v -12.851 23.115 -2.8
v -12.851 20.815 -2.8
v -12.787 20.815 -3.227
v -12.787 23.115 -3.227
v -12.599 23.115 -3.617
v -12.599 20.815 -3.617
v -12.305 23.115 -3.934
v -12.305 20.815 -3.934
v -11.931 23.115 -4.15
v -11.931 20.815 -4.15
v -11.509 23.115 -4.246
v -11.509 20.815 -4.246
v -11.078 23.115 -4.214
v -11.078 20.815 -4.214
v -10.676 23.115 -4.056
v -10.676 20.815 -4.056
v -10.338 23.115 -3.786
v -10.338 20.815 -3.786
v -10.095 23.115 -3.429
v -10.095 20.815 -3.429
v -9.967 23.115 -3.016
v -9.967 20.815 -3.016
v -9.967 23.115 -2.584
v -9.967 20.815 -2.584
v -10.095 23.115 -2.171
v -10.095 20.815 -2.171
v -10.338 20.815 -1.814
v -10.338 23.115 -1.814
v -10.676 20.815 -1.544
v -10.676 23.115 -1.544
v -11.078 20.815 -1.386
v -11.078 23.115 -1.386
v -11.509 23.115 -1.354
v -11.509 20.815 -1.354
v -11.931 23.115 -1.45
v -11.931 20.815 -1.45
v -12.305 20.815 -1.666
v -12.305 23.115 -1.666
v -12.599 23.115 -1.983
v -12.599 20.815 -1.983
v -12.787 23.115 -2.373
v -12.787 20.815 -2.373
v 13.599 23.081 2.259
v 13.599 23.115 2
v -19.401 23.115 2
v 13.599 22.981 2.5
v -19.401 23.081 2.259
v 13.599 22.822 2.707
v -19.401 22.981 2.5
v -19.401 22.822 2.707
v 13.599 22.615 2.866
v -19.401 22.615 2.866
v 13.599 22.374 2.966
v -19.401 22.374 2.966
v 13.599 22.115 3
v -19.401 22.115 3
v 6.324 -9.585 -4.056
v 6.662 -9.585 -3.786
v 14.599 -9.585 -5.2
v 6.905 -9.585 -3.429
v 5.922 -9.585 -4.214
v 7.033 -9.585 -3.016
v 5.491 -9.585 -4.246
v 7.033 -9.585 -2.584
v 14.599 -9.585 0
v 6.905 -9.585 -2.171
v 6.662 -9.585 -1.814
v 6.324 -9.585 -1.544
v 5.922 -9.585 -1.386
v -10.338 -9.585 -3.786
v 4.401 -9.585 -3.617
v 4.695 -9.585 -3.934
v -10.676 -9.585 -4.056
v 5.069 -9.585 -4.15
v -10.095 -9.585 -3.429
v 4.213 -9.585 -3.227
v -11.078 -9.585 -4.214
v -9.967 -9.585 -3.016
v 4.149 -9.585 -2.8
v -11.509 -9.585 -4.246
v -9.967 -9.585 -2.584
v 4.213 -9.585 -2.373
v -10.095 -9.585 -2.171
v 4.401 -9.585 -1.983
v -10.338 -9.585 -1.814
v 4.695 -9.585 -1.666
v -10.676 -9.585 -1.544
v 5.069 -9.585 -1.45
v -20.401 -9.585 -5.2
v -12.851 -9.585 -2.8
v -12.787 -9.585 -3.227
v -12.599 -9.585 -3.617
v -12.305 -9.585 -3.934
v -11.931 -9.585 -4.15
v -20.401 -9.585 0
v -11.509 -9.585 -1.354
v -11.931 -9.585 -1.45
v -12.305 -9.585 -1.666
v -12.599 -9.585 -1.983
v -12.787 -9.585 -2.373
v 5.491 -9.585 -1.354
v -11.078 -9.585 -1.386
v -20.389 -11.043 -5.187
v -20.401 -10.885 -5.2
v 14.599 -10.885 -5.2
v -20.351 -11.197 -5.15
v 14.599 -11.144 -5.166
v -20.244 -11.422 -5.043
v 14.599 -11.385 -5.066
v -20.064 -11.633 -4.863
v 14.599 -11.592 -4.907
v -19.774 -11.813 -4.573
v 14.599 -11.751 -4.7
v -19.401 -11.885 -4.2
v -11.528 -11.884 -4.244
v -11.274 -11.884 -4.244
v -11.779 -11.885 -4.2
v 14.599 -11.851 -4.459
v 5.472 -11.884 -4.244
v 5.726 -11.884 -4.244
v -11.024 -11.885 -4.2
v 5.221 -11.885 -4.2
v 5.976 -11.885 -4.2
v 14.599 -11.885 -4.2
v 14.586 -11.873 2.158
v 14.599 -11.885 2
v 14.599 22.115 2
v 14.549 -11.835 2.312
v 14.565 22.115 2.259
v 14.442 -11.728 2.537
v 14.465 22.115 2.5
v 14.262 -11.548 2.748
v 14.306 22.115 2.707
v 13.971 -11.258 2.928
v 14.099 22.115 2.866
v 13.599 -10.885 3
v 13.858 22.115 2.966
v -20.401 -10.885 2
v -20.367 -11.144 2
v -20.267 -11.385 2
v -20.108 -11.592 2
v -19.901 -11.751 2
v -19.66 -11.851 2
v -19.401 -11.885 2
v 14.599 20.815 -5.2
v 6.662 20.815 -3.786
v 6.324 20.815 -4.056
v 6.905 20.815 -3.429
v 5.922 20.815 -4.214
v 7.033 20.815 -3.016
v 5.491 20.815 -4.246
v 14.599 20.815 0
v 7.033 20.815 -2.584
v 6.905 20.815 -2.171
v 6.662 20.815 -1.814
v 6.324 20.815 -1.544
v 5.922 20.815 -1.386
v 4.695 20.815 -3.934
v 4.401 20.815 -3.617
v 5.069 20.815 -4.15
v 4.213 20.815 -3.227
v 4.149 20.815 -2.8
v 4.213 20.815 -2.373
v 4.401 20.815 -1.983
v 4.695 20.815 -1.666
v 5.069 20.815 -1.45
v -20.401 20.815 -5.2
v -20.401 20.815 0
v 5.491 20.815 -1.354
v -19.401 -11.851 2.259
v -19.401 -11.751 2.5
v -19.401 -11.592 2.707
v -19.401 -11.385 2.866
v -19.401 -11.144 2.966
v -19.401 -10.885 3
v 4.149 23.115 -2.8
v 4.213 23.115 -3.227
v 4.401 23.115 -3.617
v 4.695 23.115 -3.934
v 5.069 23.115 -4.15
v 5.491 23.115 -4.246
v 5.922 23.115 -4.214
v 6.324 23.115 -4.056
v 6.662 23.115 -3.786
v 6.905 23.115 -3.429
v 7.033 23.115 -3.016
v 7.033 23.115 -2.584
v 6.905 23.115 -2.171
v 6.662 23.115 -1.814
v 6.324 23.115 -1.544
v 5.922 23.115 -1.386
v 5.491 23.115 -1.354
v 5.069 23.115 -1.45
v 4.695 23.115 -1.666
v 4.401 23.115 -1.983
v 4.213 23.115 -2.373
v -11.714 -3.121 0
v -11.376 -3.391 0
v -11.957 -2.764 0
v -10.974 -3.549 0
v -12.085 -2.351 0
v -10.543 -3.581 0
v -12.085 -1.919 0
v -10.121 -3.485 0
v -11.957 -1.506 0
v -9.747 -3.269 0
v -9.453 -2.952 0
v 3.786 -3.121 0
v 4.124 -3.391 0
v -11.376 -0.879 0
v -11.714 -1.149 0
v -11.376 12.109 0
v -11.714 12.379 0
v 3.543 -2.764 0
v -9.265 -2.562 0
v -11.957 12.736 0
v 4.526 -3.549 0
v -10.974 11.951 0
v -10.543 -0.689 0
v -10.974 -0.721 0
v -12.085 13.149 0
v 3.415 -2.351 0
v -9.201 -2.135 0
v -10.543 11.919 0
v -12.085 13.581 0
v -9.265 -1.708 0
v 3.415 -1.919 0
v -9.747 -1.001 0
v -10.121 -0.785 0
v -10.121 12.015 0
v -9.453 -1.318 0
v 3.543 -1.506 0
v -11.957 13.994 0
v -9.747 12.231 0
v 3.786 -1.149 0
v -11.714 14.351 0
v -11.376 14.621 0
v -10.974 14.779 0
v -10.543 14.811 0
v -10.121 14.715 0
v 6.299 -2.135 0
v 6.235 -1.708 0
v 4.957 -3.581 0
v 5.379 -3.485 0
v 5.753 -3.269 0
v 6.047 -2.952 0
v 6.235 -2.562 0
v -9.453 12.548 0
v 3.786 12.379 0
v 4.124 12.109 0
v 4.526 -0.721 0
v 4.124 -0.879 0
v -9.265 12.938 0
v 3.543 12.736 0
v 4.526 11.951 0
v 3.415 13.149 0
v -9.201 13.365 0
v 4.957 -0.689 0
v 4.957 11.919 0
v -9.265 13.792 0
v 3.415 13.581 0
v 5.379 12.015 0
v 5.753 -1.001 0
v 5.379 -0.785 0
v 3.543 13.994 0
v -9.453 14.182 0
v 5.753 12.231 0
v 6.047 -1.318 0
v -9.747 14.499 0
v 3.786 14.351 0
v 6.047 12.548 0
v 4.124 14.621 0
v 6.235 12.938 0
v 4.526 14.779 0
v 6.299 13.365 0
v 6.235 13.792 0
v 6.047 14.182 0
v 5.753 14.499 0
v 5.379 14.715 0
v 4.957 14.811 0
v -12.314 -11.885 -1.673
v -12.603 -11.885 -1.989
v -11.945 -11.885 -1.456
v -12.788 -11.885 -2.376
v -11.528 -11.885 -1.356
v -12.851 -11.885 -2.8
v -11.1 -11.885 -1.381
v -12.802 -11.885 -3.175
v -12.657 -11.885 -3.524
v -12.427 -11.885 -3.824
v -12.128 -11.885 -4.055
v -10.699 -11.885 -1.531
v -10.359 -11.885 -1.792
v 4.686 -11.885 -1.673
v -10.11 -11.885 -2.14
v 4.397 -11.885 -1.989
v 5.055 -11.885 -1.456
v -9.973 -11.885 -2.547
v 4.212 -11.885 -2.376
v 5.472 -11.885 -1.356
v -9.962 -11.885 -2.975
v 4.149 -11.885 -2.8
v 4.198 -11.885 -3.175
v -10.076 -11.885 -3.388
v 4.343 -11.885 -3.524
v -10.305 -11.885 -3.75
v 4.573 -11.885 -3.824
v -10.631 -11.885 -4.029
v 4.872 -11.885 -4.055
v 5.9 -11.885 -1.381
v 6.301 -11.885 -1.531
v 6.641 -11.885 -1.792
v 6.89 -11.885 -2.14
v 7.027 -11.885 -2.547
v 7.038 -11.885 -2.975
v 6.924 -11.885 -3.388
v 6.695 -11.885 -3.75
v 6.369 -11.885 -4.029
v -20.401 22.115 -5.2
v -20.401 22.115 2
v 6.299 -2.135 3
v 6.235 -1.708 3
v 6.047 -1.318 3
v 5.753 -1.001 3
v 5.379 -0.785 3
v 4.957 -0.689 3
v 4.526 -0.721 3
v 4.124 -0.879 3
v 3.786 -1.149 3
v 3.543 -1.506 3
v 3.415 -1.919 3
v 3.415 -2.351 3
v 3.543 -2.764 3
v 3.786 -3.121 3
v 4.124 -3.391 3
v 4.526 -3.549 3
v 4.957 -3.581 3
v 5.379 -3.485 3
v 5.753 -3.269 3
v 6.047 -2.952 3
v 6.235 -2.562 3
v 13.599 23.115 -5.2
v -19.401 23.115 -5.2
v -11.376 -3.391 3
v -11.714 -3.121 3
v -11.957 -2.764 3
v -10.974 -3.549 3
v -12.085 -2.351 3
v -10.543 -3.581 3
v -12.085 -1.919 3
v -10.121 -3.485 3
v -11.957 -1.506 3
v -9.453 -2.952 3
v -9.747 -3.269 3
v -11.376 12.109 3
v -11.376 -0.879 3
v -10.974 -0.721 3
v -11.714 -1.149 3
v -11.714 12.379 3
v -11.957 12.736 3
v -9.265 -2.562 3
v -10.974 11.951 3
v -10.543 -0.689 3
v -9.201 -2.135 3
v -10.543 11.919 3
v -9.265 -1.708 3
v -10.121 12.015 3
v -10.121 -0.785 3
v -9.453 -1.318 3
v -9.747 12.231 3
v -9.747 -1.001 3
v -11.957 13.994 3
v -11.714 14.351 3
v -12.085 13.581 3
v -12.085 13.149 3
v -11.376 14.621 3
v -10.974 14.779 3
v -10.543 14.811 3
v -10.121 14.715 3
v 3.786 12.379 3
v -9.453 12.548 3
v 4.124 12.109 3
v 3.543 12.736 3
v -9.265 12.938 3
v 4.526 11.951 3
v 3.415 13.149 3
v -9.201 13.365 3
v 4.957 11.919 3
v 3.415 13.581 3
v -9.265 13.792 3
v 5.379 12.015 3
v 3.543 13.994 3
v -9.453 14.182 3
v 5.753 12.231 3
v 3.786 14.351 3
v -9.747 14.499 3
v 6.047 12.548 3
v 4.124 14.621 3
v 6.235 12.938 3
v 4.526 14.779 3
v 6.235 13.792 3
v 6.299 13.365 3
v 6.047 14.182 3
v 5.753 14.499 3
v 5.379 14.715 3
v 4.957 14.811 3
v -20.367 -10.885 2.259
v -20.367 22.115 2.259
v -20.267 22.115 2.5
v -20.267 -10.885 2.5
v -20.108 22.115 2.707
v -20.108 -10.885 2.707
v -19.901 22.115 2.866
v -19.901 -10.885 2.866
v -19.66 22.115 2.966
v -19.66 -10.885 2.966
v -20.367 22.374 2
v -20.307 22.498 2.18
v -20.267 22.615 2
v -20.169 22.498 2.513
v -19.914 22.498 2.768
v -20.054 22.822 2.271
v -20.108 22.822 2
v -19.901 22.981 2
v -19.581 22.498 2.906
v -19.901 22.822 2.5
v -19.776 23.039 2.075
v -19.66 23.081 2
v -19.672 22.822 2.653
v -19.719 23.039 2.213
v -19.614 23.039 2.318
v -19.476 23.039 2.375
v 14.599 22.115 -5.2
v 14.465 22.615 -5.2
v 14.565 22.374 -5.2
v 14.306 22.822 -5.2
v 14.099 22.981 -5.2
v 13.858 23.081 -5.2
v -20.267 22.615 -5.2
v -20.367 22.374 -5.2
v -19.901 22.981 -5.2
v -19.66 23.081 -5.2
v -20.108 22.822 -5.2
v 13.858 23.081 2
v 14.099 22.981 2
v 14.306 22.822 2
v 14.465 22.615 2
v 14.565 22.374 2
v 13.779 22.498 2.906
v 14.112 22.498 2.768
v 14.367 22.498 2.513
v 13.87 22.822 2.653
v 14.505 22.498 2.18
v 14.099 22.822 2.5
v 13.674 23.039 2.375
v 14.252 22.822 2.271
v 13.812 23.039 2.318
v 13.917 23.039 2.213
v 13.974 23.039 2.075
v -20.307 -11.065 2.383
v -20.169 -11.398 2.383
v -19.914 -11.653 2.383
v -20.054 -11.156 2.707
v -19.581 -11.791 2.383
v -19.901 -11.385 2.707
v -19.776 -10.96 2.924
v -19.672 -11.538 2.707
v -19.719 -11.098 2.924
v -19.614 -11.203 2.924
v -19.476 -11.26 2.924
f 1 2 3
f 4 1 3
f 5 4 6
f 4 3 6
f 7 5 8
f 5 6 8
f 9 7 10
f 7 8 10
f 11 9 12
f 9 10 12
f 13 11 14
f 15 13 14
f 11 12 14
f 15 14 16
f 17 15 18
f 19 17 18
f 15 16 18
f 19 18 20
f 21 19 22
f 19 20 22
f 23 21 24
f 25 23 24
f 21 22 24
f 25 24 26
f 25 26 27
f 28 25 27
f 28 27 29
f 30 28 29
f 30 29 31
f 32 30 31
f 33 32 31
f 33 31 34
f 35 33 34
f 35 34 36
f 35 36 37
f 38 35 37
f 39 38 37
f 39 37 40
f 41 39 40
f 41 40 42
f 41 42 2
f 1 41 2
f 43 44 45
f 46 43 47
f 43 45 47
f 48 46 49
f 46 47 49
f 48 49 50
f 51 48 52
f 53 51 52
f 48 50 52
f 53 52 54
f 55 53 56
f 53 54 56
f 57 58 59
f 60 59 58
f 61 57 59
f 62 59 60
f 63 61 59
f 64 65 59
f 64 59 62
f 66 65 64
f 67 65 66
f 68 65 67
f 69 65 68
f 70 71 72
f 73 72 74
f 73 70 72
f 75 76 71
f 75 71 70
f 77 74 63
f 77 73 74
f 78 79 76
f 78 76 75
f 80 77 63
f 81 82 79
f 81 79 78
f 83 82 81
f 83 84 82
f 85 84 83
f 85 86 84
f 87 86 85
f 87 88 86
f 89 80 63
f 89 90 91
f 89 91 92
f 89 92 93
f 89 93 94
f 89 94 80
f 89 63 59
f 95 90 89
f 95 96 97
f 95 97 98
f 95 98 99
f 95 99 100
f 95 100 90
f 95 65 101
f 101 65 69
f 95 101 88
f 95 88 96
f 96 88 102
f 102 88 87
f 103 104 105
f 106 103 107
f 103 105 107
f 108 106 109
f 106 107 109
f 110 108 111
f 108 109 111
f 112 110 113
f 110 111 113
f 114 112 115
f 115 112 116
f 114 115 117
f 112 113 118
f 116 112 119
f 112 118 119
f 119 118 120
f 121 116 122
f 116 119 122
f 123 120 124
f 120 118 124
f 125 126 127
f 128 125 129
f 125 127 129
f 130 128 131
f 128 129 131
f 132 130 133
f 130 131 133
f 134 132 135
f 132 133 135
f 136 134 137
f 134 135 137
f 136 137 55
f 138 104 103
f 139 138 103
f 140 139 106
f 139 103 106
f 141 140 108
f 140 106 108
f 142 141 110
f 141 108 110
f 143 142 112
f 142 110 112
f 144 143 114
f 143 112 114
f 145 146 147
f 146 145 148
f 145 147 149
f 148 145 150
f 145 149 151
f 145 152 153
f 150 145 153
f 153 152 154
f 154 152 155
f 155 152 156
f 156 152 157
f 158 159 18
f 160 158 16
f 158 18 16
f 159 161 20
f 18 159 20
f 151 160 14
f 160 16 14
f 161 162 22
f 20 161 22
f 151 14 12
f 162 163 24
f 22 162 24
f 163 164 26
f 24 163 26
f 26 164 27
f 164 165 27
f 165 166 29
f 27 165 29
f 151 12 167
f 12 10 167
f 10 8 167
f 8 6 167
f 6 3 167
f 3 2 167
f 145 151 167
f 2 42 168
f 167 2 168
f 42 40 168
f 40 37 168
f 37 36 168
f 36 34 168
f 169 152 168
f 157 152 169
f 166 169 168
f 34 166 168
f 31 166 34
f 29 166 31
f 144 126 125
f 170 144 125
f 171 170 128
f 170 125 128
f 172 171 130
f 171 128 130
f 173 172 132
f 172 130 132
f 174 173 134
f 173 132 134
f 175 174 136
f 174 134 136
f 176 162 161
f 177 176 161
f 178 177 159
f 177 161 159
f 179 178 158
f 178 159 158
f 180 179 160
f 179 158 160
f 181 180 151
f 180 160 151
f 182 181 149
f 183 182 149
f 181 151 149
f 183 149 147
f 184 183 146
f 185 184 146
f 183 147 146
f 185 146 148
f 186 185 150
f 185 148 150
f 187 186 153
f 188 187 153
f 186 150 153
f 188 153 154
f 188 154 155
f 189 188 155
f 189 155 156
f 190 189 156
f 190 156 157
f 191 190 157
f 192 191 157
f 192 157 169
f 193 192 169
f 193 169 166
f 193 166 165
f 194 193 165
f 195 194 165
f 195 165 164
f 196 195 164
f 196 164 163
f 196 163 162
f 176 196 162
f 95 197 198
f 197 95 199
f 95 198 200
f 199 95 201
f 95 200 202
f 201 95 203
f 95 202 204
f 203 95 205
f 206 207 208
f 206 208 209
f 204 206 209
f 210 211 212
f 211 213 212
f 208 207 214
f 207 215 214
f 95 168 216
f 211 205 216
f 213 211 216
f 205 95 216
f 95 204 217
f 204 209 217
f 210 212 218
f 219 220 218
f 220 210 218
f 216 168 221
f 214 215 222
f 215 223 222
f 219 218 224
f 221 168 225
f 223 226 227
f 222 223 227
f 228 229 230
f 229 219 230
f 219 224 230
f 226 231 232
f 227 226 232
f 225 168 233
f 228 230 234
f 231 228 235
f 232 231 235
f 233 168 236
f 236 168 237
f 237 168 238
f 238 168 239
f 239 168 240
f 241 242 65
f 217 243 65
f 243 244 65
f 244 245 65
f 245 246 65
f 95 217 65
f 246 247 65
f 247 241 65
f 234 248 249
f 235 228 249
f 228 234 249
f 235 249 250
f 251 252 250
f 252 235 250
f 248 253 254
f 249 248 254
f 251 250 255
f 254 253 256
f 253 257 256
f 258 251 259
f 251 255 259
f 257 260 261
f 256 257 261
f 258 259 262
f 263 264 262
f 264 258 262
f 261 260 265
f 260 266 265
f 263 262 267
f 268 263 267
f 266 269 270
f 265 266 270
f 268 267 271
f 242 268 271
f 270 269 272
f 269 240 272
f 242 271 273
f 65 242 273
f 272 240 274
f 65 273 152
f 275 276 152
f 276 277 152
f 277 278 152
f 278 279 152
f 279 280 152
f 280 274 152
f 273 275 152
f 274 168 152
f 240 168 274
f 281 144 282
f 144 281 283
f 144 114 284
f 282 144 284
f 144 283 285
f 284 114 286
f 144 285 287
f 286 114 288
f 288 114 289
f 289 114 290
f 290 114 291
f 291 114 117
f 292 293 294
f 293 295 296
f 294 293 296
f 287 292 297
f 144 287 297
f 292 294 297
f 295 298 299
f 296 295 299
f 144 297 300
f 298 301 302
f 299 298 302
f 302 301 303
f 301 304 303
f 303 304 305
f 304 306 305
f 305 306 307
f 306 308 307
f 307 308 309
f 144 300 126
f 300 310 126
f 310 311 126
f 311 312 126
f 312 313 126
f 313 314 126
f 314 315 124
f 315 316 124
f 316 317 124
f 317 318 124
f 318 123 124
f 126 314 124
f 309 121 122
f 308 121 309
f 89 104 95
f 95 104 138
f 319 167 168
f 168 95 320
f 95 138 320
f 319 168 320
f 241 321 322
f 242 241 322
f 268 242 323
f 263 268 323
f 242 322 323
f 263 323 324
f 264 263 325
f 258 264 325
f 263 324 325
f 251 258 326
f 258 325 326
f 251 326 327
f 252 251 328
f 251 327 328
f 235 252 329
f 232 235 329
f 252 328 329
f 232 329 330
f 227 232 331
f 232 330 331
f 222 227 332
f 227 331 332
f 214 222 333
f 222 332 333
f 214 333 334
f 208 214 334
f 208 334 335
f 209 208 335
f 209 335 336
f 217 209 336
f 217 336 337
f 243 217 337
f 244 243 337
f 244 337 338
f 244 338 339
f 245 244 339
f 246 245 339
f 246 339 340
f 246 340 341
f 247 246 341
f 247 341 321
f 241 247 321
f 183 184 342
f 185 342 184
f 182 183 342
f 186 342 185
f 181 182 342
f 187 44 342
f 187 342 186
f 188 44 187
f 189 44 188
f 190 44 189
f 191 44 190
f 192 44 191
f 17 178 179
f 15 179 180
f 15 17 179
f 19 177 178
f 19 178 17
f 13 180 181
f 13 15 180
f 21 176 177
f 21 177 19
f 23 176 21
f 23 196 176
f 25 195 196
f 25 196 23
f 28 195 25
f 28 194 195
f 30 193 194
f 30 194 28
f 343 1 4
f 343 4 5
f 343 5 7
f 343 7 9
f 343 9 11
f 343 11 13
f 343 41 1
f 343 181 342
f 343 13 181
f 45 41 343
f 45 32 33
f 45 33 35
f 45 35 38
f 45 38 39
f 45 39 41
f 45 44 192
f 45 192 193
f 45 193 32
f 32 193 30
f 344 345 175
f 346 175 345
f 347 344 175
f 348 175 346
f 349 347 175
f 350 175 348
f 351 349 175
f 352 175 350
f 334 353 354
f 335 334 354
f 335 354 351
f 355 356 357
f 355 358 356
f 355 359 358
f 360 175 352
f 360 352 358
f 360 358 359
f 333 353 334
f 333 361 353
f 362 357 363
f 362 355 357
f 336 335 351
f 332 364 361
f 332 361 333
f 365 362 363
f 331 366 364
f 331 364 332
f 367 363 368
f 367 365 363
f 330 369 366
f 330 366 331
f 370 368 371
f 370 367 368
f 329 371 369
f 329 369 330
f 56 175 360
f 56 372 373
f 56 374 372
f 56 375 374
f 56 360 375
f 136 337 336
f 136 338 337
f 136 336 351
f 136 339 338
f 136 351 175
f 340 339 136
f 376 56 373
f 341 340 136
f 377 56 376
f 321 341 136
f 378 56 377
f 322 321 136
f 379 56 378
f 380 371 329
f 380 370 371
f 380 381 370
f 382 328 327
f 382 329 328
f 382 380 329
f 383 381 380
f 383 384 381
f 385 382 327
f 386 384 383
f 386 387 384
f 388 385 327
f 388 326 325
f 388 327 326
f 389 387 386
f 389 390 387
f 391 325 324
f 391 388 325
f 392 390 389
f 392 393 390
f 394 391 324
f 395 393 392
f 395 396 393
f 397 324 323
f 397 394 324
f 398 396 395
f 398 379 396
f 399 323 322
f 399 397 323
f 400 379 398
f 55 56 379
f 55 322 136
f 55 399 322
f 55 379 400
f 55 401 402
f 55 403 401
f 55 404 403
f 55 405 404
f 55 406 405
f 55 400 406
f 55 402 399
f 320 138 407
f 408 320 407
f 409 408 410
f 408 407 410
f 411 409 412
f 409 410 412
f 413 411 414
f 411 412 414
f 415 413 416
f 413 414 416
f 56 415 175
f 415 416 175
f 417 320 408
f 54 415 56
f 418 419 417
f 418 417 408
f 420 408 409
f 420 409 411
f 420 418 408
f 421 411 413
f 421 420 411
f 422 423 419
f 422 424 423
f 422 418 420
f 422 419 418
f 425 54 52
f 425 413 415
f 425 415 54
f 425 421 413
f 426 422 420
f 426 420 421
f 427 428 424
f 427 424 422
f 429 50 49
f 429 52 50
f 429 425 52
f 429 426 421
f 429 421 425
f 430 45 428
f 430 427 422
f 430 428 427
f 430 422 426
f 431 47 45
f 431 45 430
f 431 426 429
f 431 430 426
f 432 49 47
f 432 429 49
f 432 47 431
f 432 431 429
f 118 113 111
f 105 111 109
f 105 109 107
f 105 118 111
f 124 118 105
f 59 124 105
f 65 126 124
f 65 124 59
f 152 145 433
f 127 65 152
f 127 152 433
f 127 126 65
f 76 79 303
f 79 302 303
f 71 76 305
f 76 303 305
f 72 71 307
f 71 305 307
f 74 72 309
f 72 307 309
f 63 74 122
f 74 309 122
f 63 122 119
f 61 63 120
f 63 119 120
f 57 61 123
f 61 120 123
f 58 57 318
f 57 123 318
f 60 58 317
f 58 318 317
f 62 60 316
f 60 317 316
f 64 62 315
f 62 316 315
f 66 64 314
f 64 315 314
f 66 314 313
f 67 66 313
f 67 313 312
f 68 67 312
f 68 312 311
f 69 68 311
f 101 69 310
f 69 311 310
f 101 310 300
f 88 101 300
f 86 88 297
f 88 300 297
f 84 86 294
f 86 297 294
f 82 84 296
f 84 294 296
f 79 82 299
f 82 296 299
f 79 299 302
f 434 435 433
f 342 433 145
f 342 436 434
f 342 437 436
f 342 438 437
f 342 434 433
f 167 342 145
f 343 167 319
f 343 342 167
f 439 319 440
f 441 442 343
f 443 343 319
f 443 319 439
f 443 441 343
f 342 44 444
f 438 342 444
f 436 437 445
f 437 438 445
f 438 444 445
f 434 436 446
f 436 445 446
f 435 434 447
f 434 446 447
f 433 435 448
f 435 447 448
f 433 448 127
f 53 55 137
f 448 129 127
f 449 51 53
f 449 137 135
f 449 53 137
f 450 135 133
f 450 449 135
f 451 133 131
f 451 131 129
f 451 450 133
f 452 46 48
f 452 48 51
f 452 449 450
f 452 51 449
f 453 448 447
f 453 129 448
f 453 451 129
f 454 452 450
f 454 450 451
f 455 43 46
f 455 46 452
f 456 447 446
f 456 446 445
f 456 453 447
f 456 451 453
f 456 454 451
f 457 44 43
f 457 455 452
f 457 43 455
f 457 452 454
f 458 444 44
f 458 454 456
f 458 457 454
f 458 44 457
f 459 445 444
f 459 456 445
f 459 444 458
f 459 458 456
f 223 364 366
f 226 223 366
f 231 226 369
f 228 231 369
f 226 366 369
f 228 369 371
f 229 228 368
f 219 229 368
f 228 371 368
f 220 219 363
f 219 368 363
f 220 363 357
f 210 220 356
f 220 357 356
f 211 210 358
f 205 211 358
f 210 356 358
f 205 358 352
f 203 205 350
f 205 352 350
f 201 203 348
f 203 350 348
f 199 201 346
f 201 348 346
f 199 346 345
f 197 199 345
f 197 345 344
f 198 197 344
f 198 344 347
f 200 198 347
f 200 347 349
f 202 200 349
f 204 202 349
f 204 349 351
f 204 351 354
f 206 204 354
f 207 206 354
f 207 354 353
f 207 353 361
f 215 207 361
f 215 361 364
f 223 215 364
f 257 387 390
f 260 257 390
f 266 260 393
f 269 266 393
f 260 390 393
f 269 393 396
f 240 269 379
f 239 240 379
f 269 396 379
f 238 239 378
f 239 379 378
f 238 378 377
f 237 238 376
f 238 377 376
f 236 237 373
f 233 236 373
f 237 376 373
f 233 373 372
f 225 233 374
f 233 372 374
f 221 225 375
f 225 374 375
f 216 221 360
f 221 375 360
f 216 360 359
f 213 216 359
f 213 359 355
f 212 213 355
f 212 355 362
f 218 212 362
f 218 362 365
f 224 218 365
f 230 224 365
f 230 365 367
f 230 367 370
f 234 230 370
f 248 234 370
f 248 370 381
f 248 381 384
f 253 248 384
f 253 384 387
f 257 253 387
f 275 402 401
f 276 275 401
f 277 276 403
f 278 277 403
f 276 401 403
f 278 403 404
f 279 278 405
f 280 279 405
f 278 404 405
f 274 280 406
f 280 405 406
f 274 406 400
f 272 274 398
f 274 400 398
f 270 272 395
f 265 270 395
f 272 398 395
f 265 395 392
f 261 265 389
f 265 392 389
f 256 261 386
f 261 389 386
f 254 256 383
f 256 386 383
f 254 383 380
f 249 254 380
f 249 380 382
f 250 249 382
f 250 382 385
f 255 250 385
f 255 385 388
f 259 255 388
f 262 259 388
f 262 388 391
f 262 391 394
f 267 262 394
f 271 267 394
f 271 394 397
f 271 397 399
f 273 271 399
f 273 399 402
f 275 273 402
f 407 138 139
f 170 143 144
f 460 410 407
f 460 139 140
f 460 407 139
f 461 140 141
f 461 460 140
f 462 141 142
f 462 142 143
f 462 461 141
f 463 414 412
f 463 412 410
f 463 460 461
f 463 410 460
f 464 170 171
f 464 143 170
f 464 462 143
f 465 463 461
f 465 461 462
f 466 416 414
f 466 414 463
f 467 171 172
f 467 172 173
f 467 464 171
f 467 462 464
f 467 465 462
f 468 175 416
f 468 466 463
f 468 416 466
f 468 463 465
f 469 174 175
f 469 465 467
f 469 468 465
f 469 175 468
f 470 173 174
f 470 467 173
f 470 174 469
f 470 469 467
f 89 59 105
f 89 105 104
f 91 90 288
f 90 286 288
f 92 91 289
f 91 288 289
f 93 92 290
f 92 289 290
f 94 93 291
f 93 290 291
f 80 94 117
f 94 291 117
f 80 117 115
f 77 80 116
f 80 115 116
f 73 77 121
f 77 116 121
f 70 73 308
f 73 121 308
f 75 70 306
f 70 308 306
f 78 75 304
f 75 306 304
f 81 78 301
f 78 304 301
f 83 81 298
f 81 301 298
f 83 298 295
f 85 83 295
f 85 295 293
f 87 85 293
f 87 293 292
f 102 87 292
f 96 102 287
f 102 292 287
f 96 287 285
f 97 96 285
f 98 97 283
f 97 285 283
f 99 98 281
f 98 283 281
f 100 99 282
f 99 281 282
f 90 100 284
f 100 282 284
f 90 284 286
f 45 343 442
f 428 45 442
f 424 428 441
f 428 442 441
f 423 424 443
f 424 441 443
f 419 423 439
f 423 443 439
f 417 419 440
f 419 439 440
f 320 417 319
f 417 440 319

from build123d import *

# Parameters (mm, degrees)
ESQUISSE1_W             = 35
ESQUISSE1_H             = 35
BOSS_EXTRU_1_DEPTH      = 3
ESQUISSE2_W             = 35
ESQUISSE2_H             = 2.3
BOSS_EXTRU_2_DEPTH      = 5.2
ESQUISSE3_R             = 1.25
ENL_V_MAT_EXTRU_1_DEPTH = 45
D_GAGEMENT_M2_51_D      = 2.9
D_GAGEMENT_M2_52_D      = 2.9
D_GAGEMENT_M2_53_D      = 2.9
CONG_1_R                = 1


with BuildPart() as part:
    # Esquisse1 → Boss.-Extru.1 (new body)
    with BuildSketch(Plane.XY):
        with Locations((-2.901069519, 5.614973262)):
            Rectangle(ESQUISSE1_W, ESQUISSE1_H)
    extrude(amount=BOSS_EXTRU_1_DEPTH)

    # Esquisse2 → Boss.-Extru.2 (add)
    with BuildSketch(Plane(origin=(0, 0, 0), x_dir=(-1, 0, 0), z_dir=(0, 0, -1))):
        with Locations((2.901069519, 21.964973262)):
            Rectangle(ESQUISSE2_W, ESQUISSE2_H)
        with Locations((2.901069519, -10.735026738)):
            Rectangle(ESQUISSE2_W, ESQUISSE2_H)
    extrude(amount=BOSS_EXTRU_2_DEPTH)

    # Esquisse3 → Enlèv. mat.-Extru.1 (cut)
    with BuildSketch(Plane(origin=(0, 23.114973262, 0), x_dir=(1, 0, 0), z_dir=(0, 1, 0))):
        with Locations(Location((-11.401069519, 2.8, 0), (0, 0, 270))):
            Circle(ESQUISSE3_R)
        with Locations(Location((5.598930481, 2.8, 0), (0, 0, 270))):
            Circle(ESQUISSE3_R)
    extrude(amount=-ENL_V_MAT_EXTRU_1_DEPTH, mode=Mode.SUBTRACT)

    # Dégagement M2.51 (through all)
    with Locations(Plane(origin=(0, 23.114973262, 0), x_dir=(1, 0, 0), z_dir=(0, 1, 0))):
        with Locations((-11.401069519, 2.8), (5.598930481, 2.8)):
            Hole(D_GAGEMENT_M2_51_D / 2)

    # Dégagement M2.52 (through all)
    with Locations(Plane(origin=(0, -11.885026738, 0), x_dir=(-1, 0, 0), z_dir=(0, -1, 0))):
        with Locations((11.401069519, 2.8), (-5.598930481, 2.8)):
            Hole(D_GAGEMENT_M2_52_D / 2)

    # Dégagement M2.53 (through all)
    with Locations(Plane(origin=(0, 0, 0), x_dir=(-1, 0, 0), z_dir=(0, 0, -1))):
        with Locations((-4.848930481, 13.364973262), (10.651069519, 13.364973262), (10.651069519, -2.135026738), (-4.848930481, -2.135026738)):
            Hole(D_GAGEMENT_M2_53_D / 2)

    # Congé1
    # the kernel refuses this fillet: 1 mm, written as the material it takes off along each edge
    with BuildSketch(Plane(origin=(13.598930481, 22.114973262, 2), x_dir=(0, 0, 1), z_dir=(0, 1, 0))) as cong_1_piece_1_section:
        Polygon((0, 0), (CONG_1_R, 0), (CONG_1_R, CONG_1_R), (0, CONG_1_R), align=None)
    cong_1_piece_1 = extrude(amount=CONG_1_R, mode=Mode.PRIVATE)
    cong_1_piece_1 = cong_1_piece_1 - Plane(origin=(13.598930481, 22.114973262, 2), x_dir=(-0.7071067811865475, 0, -0.7071067811865475), z_dir=(0, 1, 0)) * Sphere(CONG_1_R, mode=Mode.PRIVATE)
    add(cong_1_piece_1, mode=Mode.SUBTRACT)
    with BuildSketch(Plane(origin=(-19.401069519, 22.114973262, 2), x_dir=(0, 0, 1), z_dir=(0, 1, 0))) as cong_1_piece_2_section:
        Polygon((0, 0), (CONG_1_R, 0), (CONG_1_R, -CONG_1_R), (0, -CONG_1_R), align=None)
    cong_1_piece_2 = extrude(amount=CONG_1_R, mode=Mode.PRIVATE)
    cong_1_piece_2 = cong_1_piece_2 - Plane(origin=(-19.401069519, 22.114973262, 2), x_dir=(0.7071067811865475, 0, -0.7071067811865475), z_dir=(0, 1, 0)) * Sphere(CONG_1_R, mode=Mode.PRIVATE)
    add(cong_1_piece_2, mode=Mode.SUBTRACT)
    with BuildSketch(Plane(origin=(-19.401069519, -10.885026738, 2), x_dir=(-1, 0, 0), z_dir=(0, 0, 1))) as cong_1_piece_3_section:
        Polygon((0, 0), (CONG_1_R, 0), (CONG_1_R, CONG_1_R), (0, CONG_1_R), align=None)
    cong_1_piece_3 = extrude(amount=CONG_1_R, mode=Mode.PRIVATE)
    cong_1_piece_3 = cong_1_piece_3 - Plane(origin=(-19.401069519, -10.885026738, 2), x_dir=(0.7071067811865475, 0.7071067811865477, 0), z_dir=(0, 0, 1)) * Sphere(CONG_1_R, mode=Mode.PRIVATE)
    add(cong_1_piece_3, mode=Mode.SUBTRACT)
    with BuildSketch(Plane(origin=(14.598930481, 22.114973262, 3), x_dir=(-1, 0, 0), z_dir=(0, -1, 0)), Plane(origin=(17.098930481, -11.885026738, 3), x_dir=(0, 1, 0), z_dir=(-1, 0, 0))) as cong_1_piece_4:
        with BuildLine():
            CenterArc((CONG_1_R, CONG_1_R), CONG_1_R, 180, 90)
            Line((0, CONG_1_R), (0, 0))
            Line((0, 0), (CONG_1_R, 0))
        make_face()
    extrude(amount=36.5, mode=Mode.SUBTRACT)
    with BuildSketch(Plane(origin=(-19.401069519, 23.114973262, 3), x_dir=(0, 0, -1), z_dir=(1, 0, 0))) as cong_1_piece_5:
        with BuildLine():
            CenterArc((CONG_1_R, -CONG_1_R), CONG_1_R, 90, 90)
            Line((0, -CONG_1_R), (0, 0))
            Line((0, 0), (CONG_1_R, 0))
        make_face()
    extrude(amount=33, mode=Mode.SUBTRACT)
    with BuildSketch(Plane(origin=(17.098930481, -11.885026738, -5.2), x_dir=(0, 0, 1), z_dir=(-1, 0, 0))) as cong_1_piece_6:
        with BuildLine():
            CenterArc((CONG_1_R, CONG_1_R), CONG_1_R, 180, 90)
            Line((0, CONG_1_R), (0, 0))
            Line((0, 0), (CONG_1_R, 0))
        make_face()
    extrude(amount=40, mode=Mode.SUBTRACT)
    with BuildSketch(Plane(origin=(-20.401069519, -10.885026738, 3), x_dir=(1, 0, 0), z_dir=(0, 1, 0))) as cong_1_piece_7:
        with BuildLine():
            CenterArc((CONG_1_R, CONG_1_R), CONG_1_R, 180, 90)
            Line((0, CONG_1_R), (0, 0))
            Line((0, 0), (CONG_1_R, 0))
        make_face()
    extrude(amount=33, mode=Mode.SUBTRACT)
    with BuildSketch(Plane(origin=(-20.401069519, 23.114973262, -7.7), x_dir=(1, 0, 0), z_dir=(0, 0, 1)), Plane(origin=(14.598930481, 23.114973262, 2), x_dir=(-1, 0, 0), z_dir=(0, 0, -1)), Plane(origin=(-20.401069519, -11.885026738, -7.7), x_dir=(0, 1, 0), z_dir=(0, 0, 1))) as cong_1_piece_8:
        with BuildLine():
            CenterArc((CONG_1_R, -CONG_1_R), CONG_1_R, 90, 90)
            Line((0, -CONG_1_R), (0, 0))
            Line((0, 0), (CONG_1_R, 0))
        make_face()
    extrude(amount=9.7, mode=Mode.SUBTRACT)


solid = part.part
